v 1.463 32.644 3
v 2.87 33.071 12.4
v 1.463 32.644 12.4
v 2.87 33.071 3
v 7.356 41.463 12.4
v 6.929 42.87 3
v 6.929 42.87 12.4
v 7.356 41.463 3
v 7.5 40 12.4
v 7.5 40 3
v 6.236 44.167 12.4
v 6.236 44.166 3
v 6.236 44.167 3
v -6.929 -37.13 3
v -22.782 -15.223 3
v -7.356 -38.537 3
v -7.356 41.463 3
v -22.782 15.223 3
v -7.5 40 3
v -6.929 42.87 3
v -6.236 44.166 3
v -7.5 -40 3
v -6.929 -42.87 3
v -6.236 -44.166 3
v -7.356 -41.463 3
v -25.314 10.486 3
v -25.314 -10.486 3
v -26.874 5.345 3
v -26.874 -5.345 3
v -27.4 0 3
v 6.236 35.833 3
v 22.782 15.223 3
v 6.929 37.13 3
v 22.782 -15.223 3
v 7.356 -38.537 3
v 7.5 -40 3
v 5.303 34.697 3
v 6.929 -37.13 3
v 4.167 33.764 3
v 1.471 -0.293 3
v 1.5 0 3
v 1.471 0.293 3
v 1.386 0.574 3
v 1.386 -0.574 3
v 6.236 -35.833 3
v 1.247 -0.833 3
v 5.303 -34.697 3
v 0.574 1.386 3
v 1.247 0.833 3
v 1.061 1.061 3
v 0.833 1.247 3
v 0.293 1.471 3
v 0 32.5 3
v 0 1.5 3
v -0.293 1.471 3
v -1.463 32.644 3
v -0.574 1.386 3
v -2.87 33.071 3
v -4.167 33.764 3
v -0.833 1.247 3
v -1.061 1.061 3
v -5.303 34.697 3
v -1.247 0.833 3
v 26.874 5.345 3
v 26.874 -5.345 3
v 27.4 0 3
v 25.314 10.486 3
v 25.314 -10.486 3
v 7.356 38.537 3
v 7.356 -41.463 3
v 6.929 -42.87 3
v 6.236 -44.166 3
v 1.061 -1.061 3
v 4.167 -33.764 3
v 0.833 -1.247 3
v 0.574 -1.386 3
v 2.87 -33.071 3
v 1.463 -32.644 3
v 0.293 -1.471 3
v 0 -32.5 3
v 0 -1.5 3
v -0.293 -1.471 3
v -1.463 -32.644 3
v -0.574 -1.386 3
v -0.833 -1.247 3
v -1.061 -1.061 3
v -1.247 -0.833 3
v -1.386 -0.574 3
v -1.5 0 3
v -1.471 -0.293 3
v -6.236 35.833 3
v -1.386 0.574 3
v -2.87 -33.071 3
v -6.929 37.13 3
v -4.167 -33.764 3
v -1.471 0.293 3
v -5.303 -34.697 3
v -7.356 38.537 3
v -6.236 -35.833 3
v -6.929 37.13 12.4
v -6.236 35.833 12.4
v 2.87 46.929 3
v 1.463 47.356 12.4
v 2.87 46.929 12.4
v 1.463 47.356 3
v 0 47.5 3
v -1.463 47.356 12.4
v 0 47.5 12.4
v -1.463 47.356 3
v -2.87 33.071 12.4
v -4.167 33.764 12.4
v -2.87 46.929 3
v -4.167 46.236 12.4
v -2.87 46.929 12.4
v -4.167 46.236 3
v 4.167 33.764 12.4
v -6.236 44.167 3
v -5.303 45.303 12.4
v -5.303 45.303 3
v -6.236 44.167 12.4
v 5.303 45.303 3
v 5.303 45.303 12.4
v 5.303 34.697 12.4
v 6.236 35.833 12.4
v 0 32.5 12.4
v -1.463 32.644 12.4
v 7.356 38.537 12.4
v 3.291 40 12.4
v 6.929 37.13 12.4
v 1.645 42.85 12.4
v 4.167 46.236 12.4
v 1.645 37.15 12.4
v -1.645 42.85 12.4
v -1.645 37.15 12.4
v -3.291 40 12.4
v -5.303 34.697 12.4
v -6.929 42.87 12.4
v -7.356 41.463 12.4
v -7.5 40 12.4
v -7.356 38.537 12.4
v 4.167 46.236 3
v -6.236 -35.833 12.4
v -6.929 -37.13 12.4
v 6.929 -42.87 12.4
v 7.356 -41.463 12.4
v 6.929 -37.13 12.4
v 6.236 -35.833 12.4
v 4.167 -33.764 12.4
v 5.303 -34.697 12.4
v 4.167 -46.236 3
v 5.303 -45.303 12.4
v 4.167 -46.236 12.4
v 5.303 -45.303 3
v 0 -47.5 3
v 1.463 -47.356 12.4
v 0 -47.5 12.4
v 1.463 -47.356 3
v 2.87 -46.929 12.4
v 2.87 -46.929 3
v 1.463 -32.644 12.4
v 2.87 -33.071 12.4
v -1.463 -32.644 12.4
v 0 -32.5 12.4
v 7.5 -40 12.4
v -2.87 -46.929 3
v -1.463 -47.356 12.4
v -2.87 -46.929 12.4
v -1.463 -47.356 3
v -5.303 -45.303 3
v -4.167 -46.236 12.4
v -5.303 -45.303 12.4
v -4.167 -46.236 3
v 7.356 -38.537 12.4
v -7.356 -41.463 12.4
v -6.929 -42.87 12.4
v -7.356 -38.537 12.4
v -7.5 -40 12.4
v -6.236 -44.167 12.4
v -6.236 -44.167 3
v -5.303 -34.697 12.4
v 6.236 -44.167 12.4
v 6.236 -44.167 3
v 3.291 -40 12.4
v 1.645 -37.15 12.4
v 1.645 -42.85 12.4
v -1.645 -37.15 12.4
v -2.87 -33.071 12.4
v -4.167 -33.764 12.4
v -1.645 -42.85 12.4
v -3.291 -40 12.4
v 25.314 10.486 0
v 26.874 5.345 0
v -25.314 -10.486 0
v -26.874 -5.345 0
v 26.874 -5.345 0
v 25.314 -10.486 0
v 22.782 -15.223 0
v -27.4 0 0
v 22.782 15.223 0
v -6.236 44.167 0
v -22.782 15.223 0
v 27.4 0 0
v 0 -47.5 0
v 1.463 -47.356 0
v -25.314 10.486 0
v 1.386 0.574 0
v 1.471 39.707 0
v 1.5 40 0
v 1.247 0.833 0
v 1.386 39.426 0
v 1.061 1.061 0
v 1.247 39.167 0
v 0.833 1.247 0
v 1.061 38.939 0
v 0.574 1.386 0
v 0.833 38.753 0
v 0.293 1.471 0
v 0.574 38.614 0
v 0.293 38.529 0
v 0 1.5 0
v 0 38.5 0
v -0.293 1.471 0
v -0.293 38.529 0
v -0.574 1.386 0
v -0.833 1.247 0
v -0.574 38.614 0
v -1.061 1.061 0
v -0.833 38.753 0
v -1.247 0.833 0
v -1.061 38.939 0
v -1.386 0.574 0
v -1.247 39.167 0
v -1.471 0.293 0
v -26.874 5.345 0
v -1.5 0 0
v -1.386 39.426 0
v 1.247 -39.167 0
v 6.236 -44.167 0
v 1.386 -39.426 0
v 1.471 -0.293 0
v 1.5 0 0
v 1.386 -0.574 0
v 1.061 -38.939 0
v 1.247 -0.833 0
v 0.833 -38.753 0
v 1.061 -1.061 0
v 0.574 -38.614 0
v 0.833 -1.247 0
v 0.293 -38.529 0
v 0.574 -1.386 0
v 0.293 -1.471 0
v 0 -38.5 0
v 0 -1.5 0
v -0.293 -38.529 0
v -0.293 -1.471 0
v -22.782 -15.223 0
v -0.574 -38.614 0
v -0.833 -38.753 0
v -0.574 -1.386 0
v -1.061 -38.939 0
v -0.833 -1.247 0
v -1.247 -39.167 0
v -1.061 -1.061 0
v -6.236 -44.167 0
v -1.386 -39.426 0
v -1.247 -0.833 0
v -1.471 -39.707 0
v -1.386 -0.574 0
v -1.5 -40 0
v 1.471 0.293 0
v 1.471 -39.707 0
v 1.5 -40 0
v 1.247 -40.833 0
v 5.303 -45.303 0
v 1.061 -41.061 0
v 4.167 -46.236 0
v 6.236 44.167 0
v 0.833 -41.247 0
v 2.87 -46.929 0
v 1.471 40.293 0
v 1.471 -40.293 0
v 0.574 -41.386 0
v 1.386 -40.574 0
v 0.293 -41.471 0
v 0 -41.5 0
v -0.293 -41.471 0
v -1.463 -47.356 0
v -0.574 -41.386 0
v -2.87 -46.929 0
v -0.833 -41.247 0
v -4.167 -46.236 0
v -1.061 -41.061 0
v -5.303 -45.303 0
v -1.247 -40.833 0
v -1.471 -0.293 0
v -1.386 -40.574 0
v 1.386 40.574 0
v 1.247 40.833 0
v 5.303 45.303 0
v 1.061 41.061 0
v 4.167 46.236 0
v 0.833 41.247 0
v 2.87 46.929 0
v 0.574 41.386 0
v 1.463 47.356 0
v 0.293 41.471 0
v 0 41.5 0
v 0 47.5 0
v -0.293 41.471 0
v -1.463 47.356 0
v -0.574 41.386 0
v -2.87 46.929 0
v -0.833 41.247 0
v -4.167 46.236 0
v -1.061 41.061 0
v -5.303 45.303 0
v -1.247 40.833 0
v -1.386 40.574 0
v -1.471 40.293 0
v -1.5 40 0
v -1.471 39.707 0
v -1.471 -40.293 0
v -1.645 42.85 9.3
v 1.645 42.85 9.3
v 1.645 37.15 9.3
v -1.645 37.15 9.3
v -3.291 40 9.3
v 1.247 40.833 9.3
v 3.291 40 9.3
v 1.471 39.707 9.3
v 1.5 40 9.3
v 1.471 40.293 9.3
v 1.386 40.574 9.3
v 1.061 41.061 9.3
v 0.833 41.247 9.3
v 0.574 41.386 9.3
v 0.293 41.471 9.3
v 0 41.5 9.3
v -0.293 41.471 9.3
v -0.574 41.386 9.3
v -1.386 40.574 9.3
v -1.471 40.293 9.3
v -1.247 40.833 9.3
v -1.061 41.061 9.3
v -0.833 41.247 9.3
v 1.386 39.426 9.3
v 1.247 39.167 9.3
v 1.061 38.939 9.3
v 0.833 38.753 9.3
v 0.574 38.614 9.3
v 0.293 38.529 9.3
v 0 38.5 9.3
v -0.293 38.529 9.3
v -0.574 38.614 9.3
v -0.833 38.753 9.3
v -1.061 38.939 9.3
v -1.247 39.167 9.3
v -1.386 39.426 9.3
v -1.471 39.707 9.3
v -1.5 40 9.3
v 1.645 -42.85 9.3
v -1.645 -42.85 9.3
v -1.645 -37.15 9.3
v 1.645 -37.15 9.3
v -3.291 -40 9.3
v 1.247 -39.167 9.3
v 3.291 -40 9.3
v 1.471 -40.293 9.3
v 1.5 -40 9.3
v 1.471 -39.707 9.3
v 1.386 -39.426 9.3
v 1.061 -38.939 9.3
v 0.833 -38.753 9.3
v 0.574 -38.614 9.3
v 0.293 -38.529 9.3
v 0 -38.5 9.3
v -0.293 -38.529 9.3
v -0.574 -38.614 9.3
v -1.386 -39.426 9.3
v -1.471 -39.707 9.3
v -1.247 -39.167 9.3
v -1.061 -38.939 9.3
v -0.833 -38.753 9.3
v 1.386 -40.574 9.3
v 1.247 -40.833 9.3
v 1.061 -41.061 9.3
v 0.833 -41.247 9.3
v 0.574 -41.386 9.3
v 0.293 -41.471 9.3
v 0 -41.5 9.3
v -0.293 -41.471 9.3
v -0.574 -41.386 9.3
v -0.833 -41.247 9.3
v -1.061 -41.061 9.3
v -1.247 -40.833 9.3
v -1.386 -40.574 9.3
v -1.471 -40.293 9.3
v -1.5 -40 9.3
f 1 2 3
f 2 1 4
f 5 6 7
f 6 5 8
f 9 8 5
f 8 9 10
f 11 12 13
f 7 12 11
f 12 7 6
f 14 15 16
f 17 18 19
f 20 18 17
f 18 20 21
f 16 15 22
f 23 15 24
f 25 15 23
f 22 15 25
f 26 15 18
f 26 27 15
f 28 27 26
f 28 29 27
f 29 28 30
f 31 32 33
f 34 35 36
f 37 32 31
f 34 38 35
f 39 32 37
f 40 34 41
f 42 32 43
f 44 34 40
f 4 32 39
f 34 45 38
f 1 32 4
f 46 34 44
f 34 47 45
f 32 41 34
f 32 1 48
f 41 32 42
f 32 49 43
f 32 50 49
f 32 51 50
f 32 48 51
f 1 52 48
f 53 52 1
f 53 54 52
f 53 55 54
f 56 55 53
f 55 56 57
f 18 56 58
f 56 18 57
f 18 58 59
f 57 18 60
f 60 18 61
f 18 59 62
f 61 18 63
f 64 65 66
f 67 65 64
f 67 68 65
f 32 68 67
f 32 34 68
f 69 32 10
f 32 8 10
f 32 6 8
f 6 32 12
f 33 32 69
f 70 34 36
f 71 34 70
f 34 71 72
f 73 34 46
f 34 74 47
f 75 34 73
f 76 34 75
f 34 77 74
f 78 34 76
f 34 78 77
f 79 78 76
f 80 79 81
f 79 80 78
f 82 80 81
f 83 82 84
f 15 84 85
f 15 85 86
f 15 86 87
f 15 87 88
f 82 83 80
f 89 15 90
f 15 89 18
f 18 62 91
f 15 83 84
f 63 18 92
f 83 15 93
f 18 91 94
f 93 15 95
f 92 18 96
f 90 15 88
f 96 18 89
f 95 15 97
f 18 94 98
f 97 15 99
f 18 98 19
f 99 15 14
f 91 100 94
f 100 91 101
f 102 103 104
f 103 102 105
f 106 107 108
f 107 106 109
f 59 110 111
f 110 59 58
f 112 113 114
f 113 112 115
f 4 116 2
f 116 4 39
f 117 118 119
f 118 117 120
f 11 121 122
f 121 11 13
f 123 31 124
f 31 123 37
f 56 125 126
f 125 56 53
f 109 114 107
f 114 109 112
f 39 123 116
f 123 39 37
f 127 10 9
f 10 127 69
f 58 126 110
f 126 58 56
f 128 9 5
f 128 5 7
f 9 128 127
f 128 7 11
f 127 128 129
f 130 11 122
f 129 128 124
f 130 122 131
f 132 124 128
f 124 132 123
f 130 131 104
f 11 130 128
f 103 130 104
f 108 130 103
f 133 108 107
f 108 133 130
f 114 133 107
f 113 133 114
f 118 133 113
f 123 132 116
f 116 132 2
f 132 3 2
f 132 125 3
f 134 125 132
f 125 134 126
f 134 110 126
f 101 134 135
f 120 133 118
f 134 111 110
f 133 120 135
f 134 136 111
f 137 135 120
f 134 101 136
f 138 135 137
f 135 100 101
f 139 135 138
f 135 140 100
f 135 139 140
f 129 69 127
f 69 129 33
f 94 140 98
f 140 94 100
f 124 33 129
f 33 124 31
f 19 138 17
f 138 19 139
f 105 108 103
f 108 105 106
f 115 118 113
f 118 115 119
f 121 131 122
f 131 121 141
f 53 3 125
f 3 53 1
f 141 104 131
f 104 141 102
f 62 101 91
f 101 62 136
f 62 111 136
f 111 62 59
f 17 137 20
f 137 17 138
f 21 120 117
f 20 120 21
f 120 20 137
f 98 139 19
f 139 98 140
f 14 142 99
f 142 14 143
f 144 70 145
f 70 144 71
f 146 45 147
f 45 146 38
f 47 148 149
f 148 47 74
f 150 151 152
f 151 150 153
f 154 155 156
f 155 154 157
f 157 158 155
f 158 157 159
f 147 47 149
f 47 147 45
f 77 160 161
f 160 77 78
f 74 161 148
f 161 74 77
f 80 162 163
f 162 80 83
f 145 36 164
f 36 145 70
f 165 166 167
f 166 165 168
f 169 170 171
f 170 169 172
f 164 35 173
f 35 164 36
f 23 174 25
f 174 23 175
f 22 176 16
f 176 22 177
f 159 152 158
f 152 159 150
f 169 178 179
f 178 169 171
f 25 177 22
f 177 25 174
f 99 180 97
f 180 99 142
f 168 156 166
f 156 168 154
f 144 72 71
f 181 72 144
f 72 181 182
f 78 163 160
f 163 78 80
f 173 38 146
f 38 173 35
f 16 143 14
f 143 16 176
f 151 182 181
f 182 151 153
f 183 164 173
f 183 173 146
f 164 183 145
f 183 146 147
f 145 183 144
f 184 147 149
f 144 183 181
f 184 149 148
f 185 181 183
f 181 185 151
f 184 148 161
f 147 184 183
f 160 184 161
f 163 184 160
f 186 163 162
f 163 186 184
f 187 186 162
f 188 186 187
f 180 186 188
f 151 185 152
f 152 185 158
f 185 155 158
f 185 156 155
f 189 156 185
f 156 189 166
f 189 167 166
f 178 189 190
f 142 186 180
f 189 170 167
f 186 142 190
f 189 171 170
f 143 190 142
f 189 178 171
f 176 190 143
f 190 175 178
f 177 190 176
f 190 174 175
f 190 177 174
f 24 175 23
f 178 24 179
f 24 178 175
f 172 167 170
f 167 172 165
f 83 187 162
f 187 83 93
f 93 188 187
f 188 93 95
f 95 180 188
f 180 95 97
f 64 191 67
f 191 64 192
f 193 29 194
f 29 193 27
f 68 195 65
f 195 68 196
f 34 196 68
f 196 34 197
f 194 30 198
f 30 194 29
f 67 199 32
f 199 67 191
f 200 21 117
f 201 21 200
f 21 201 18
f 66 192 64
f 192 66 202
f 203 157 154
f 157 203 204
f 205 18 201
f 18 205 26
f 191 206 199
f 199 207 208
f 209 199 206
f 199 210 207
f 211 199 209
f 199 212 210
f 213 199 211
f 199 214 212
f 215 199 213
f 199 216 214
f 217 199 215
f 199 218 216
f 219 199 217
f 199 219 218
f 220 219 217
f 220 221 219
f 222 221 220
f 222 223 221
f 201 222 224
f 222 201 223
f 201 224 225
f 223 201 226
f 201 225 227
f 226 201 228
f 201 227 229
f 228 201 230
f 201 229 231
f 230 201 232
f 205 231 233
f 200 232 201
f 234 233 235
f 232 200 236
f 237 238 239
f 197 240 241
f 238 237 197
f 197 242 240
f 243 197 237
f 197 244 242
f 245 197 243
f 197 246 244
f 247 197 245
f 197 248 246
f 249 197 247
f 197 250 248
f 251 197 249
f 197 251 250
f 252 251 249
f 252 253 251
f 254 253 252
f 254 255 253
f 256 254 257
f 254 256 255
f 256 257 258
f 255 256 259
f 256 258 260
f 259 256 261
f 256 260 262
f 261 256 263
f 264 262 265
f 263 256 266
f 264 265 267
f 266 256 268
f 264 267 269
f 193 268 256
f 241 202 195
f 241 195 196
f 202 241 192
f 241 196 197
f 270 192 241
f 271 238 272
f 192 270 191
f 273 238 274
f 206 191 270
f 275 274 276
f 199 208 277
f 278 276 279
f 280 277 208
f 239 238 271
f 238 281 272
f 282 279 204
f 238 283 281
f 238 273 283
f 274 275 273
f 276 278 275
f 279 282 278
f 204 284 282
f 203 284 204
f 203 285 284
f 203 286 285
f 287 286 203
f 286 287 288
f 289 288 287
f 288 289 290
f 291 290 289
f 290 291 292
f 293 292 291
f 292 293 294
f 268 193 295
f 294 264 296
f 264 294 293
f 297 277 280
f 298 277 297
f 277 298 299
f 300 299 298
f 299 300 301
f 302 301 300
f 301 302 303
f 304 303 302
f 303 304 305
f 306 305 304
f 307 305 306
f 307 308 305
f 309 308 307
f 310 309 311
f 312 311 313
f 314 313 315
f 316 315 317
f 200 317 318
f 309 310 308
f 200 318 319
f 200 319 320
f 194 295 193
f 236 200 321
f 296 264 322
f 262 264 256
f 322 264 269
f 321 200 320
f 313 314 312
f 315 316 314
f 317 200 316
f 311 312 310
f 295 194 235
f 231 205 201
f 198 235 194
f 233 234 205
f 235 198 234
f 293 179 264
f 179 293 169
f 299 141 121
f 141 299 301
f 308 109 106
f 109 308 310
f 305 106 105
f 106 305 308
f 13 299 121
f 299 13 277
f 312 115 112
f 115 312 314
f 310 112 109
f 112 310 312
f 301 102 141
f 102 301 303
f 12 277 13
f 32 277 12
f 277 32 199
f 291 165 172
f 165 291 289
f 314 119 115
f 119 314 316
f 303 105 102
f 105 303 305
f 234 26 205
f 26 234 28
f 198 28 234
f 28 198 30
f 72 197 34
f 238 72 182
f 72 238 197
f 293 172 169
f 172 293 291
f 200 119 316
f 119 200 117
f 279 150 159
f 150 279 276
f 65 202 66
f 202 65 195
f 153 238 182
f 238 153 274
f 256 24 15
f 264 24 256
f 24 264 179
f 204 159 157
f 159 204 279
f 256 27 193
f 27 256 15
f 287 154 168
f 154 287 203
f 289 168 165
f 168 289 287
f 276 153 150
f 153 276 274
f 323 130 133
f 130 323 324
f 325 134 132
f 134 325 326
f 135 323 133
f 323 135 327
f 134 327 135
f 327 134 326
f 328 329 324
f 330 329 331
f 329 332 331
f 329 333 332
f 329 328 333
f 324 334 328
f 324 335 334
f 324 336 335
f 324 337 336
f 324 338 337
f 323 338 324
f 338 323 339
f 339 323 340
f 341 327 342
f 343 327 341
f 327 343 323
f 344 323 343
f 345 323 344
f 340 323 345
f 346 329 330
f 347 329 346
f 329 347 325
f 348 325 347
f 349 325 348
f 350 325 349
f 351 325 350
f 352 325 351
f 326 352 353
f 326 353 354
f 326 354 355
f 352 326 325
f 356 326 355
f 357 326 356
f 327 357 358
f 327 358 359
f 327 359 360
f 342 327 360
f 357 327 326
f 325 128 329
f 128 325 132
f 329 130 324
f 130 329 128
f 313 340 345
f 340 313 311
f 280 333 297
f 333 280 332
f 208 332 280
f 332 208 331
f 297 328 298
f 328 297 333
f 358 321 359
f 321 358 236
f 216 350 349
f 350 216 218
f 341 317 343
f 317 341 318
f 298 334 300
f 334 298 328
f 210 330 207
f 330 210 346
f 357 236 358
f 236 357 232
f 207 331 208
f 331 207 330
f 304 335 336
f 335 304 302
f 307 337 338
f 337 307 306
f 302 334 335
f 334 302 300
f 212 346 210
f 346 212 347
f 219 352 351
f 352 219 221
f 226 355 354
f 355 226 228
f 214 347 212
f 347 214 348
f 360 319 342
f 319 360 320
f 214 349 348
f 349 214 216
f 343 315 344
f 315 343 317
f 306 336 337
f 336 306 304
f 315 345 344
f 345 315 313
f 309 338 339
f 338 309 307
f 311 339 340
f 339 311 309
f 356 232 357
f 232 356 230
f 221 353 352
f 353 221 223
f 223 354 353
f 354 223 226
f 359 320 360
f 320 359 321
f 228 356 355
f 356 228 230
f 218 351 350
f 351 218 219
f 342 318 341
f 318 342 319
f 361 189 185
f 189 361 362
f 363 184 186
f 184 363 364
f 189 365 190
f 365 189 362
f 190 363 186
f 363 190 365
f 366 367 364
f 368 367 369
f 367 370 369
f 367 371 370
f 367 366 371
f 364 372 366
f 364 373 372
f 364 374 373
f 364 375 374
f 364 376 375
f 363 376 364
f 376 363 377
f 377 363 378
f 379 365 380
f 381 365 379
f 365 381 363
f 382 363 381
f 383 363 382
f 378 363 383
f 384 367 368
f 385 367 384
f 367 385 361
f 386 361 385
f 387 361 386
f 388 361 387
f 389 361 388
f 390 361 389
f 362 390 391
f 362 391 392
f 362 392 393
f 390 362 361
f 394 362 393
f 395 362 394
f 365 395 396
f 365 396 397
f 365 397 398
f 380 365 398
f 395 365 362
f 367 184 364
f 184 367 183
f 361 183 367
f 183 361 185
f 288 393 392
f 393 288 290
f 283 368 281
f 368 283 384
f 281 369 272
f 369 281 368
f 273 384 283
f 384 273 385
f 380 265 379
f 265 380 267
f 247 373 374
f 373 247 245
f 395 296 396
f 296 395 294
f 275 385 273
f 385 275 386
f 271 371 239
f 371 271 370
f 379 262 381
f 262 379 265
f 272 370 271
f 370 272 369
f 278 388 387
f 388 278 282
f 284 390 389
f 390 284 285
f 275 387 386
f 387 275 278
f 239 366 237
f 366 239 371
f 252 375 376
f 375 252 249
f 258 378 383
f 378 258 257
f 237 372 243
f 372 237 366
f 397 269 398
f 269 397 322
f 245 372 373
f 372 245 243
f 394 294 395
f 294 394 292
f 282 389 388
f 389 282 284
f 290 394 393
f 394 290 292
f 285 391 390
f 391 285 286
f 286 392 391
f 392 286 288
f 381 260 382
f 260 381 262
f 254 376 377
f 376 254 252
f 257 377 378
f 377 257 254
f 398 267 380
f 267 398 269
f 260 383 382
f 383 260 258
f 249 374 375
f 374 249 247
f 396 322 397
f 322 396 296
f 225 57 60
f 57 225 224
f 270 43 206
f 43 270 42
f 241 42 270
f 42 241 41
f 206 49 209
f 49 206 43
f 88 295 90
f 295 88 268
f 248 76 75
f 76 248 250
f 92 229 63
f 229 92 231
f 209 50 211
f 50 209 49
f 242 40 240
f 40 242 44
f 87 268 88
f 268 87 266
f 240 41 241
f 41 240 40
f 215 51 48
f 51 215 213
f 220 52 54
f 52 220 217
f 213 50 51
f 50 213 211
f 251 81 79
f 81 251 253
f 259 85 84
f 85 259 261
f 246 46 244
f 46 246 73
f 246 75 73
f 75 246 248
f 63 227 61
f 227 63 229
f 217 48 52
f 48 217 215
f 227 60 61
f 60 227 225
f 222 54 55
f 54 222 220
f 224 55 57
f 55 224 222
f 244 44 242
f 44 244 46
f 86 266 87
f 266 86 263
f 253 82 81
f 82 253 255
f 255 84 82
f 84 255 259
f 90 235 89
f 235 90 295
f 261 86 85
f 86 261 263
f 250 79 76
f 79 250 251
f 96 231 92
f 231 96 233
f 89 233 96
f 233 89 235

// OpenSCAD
// file: oem/generic/third_party/shortcuts.scad
// ShortCuts.scad 
// Autor: Rudolf Huttary, Berlin 2015
//
$fn = 100; 


//show_examples(); 

module show_examples()
	place_in_rect(30, 30)
	{
		Cy(h = 10); 
		CyH(h = 10); 
		CyH(h = 10, w = 30); 
		CyS(h = 10); 
		CyS(h = 10, w1 = 25, w2 = 75); 
		Cu(10); 
		Ri(h = 10); 
		RiH(h = 10); 
		RiS(h = 10, w1 = 10); 
		RiS(h = 10, w1 = 30, w2 = 300); 
		Sp(); 
		SpH(10, 30, 30); 
	}



module help()
{
echo("==============="); 
echo("help(): shows this help"); 
echo("show_examples(): shows some examples"); 
echo("place_in_rect(): places children objects in grid"); 
echo("Transformations:"); 
echo(" transform :  T(x=0, y=0, z=0), Tx(x=0) , Ty(y=0), Tz(z=0)"); 
echo(" rotate :  R(x=0, y=0, z=0), Rx(x=0) , Ry(y=0), Rz(z=0)"); 
echo(" scale :  S(x=1, y=1, z=1), Sx(x=1) , Sy(y=1), Sz(z=1)"); 
echo("Logical"); 
echo(" difference :  D()"); 
echo(" union :  U()"); 
echo(" intersection : *missing*"); 
echo("Primitives"); 
echo(" circle :  Ci(r=10)"); 
echo(" circle_half :  CiH(r=10, w=0)")
echo(" circle_segment :  CiS(r=10, w1=0, w2=90)")
echo(" square :  Sq(x=10, y=0, center=true))"); 
echo(" cylinder :  Cy(r=10, h=1, center=true)"); 
echo(" cylinder_half :  CyH(r=10, w=0)")
echo(" cylinder_segment: CyS(r=10, h=1, w1=0, w2=90,center=true)"); 
echo(" cylinder_segment: Pie(r=10, h=1, w1=0, w2=90,center=true)"); 
echo(" cube :  Cu(x=10, y=0, z=10, center=true)"); 
echo(" ring :  Ri(R=10, r=5, h=1, center=true)"); 
echo(" ring_half :  RiH(R=10, r=5, h=1, w=0 center=true)"); 
echo(" ring_segment :  RiS(R=10, r=5, h=1, w1=0, w2=90, center=true)"); 
echo(" sphere:  Sp(r=10))"); 
echo(" sphere_half:  SpH(r=10, w1 = 0, w2 = 0))"); 
echo("==============="); 
}


// Euclidean Transformations

module T(x=0, y=0, z=0){translate([x, y, z])children(); }
module Tx(x) { translate([x, 0, 0])children(); }
module Ty(y) { translate([0, y, 0])children(); }
module Tz(z) { translate([0, 0, z])children(); }


module R(x=0, y=0, z=0){rotate([x, y, z]) children();}
module Rx(x=90){rotate([x, 0, 0]) children();}
module Ry(y=90){rotate([0, y, 0]) children();}
module Rz(z=90){rotate([0, 0, z]) children();}

module S(x=1, y=1, z=1){scale([x, y, z]) children();}
module Sx(x=1){scale([x, 1, 1]) children();}
module Sy(y=1){scale([1, y, 1]) children();}
module Sz(z=1){scale([1, 1, z]) children();}


module D() difference(){children(0); children([1:$children-1]);}
module U() children([0:$children-1]);
// module I() intersection()children([0:$children-1]); // does not work for some reason


// primitives - 2D

module Sq(x =10, y = 0, center = true)
{
   if(y==0)
		square([x, x], center = center); 
	else
		square([x, y], center = center); 
}
module Ci(r = 10)
{
	circle(r = r); 
}

// derived primitives - 2d
module CiH(r = 10, w = 0)
  circle_half(r, w); 

module CiS(r = 10, w1 = 0, w2 = 90)
  circle_segment(r, w1, w2); 


// primitives - 3d
module Cy(r = 10, h = 1, center = true)
{
	cylinder(r = r, h = h, center = center); 
}
module Cu(x = 10, y = 0, z = 10, center = true)
{
  if (y==0)
	cube([x, x, x], center = center); 
  else
	cube([x, y, z], center = center); 
}

// derived primitives - 3d
module CyH(r = 10, h = 1, w = 0, center = true)
  cylinder_half(r, h, w, center); 

module CyS(r = 10, h = 1, w1 = 0, w2 = 90, center = true)
  cylinder_segment(r, h, w1, w2, center); 

module Ri(R = 10, r = 5, h = 1, center = true)
  ring(R, r, h, center); 

module RiS(R = 10, r = 5, h = 1, w1 = 0, w2 = 90, center = true)
   ring_segment(R, r, h, w1, w2, center); 

module RiH(r1 = 10, r2, h = 1, w = 0, center = true)
   ring_half(r1, r2, h, w, center); 
module Pie(r = 10, h = 1, w1 = 0, w2 = 90, center = true)
  cylinder_segment(r, h, w1, w2, center);  
module Sp(r = 10)
  sphere(r); 
module SpH(r = 10, w1 = 0, w2 = 0)
  sphere_half(r, w1, w2); 
module SpS(r = 10, w1 = 0, w2 = 90, w3 = 90)
  sphere_segment(r, w1, w2); 




// clear text definitions
module circle_half(r = 10, w = 0)
{
	difference()
	{
		circle(r); 
     rotate([0, 0, w-90])
     translate([0, -r])
		square([r, 2*r], center = false); 
	}
}

module circle_segment(r = 10, w1 = 0, w2 = 90)
{
  W2 = (w1>w2)?w2+360:w2; 
  if (W2-w1 < 180)
    intersection()
		{
       circle_half(r, w1); 
       circle_half(r, W2-180); 
 		}
	else
    union()
		{
       circle_half(r, w1); 
       circle_half(r, W2-180); 
 		}
}

module cylinder_half(r = 10, h = 1, w = 0, center = true)
{
  linear_extrude(height = h, center = center)
  circle_half(r, w); 
} 

module cylinder_segment(r = 10, h = 1, w1 = 0, w2 = 90, center = true)
{
  linear_extrude(height = h, center = center)
  circle_segment(r, w1, w2); 
} 

module ring(R = 10, r = 5, h = 1, center = true)
{
	difference()
	{
	cylinder(r = R, h = h, center = center); 
   translate([0, 0, -2*h])
	cylinder(r = r, h = 4*h, center = false); 
	}
}

module ring_half(R = 10, r = 5, h = 1, w = 0, center = true)
{
	difference()
	{
		ring(R, r, h, center); 
     rotate([0, 0, w])
     translate([0, -R/2, 0])
		cube([2*R, R, 3*h], center = true); 
	}
}

module ring_segment(R = 10, r = 5, h = 1, w1 = 0, w2 = 90, center = true)
{
  W2 = (w1>w2)?w2+360:w2; 
  if (W2-w1 < 180)
    intersection()
		{
       ring_half(R, r, h, w1, center); 
       ring_half(R, r, h, W2-180, center); 
 		}
	else
    union()
		{
       ring_half(R, r, h, w1, center); 
       ring_half(R, r, h, W2-180, center); 
 		}
}


module sphere_half(r = 10, w1 = 0, w2 = 0)
{  
	difference()
	{
   	sphere(r); 
      rotate([-w1, -w2, 0])
     	translate([0, 0, r])
		cube(2*r, 2*r, r, center = true); 
	}

}


// additional code
module place_in_rect(dx =20, dy=20)
{
  cols = ceil(sqrt($children)); 
  rows = floor(sqrt($children)); 
  for(i = [0:$children-1])
	{ 
	  T(dx*(-cols/2+(i%cols)+.5), dy*(rows/2-floor(i/cols)-.5))
		 children(i); 
	}
}
// file: oem/generic/third_party/springs.scad
include <shortcuts.scad>  // http://www.thingiverse.com/thing:644830
$fn = 100;
help();
//examples();  // slow!! F6 takes hours!
module examples()
{
place_in_rect(60, 60)
{
// examples spring:
	spring(Windings = 7, R = 10, r = 1, h = 20);  // clockwise
	R(90) spring(Windings = 3, R = 12, r = 2, h = -60); // ccw

// examples helicoils:
	helicoil(Windings = 10);  // square wire
	helicoil(clockwise = false, square = true);  // ccw + round wire

// examples elliptic rings:
	elliptic_ring(10, 5, 1);
	elliptic_ring(10, 10, 1);  // non elliptic
	elliptic_ring(h = 10);  // element of a spring
	elliptic_ring(h = 10, w = 240);  // partial ring

// example chain:
	U()
	{
	 Rx(90) T(15) elliptic_ring(); 
	 elliptic_ring(); 
	 Rx(90) T(-15) elliptic_ring(); 
	}
}
}

module help()
{
	echo("===== springs.scad - signatures [by Rudolf Huttary, Berlin] ===="); 
	echo("elliptic_ring(r1 = 10, r2 = 5, r = 2, slices = 100, h = 0, w = 360)
"); 
	echo("helicoil(Windings = 5, R = 20, r = 1, slices = 50, clockwise = true, square = true)"); 
	echo("spring(Windings = 5, R = 20, r=2, h = 20, slices = 50)"); 
	echo("elliptic_spring(Windings = 5, R1 = 20, R2 = 0, r=1, h = 20, slices = 50)"); 
	echo("===== springs.scad - end ===="); 
}


module elliptic_ring(r1 = 10, r2 = 5, r = 2, slices = 100, h = 0, w = 360)
{
	dz = h/slices; 
   dwx = atan(h/(r1+r2)/PI); 
	for (i = [0:slices-1])
	hull()
	{
		T(r1*cos((i+1)*w/slices), r2*sin((i+1)*w/slices), (i+1)*dz)
	   R(90+dwx, 0, (i+1)*w/slices)
		Cy(r = r, h = .01); 
	
		T(r1*cos((i)*w/slices), r2*sin((i)*w/slices), i*dz)
	   R(90+dwx, 0, i*w/slices)
		Cy(r = r, h = .01); 
	}
}

module helicoil(Windings = 5, R = 20, r = 1, slices = 50, clockwise = true, square = true)
{
  $fn = square? 4 :$fn; 
  h = clockwise?Windings*2*r:-Windings*2*r; 
  spring(Windings, R, r, h, slices); 
  T((.5*R)/2, r)
  Ry(90 )
  Cy(r, 1.5*R); 
}

module spring(Windings = 5, R = 20, r=2, h = 20, slices = 50)
	elliptic_spring(Windings, R, 0, r, h, slices); 

module elliptic_spring(Windings = 5, R1 = 20, R2 = 0, r=1, h = 20, slices = 50)
{
   dh = h/Windings;   
   r2 = (R2==0)?R1:R2; 
	for(j = [0:Windings-1])
		Tz(j*dh)
		elliptic_ring(R1, r2, r, slices, dh); 
}
// file: oem/m3_nut.scad
function vM3NutDatasheet() =
     [["e_min", 6.01], ["s_max", 5.5], ["m_max", 2.4]];



module mM3Nut() {
     import("stl/din934_m3_nut.stl");
}

mM3Nut();
// file: oem/f2276_sae1070_spring.scad
include <generic/lib.scad>;

use <generic/third_party/springs.scad>

function vF2276SAE1070SpringDatasheet() =
     let(wire_diameter=1, outer_diameter=18.1,
         inner_diameter=outer_diameter-2*wire_diameter,
         n_windings=8, free_length=43)
     [["outer_diameter", outer_diameter],
      ["inner_diameter", inner_diameter],
      ["wire_diameter", wire_diameter],
      ["pitch", free_length/n_windings],
      ["n_windings", n_windings],
      ["free_length", free_length]];

kF2276SAE1070SpringLength = property(vF2276SAE1070SpringDatasheet(), "free_length");

module mF2276SAE1070Spring(length=kF2276SAE1070SpringLength) {
     assert(length > 0);
     assert(length <= kF2276SAE1070SpringLength);

     datasheet = vF2276SAE1070SpringDatasheet();
     n_windings = property(datasheet, "n_windings");
     main_radius = (property(datasheet, "outer_diameter") +
                    property(datasheet, "inner_diameter")) / 4;
     wire_radius = property(datasheet, "wire_diameter") / 2;

     translate([0, 0, wire_radius])
     spring(Windings=n_windings, R=main_radius, r=wire_radius, h=length - 2 * wire_radius, slices=50);
}

mF2276SAE1070Spring();
// file: generic/ball_caster_support.scad
include <lib.scad>;

use <ball_caster_yoke.scad>;

function pvBallCasterSupportDatasheet(ball_diameter, ball_protrusion, ball_gap,
                                      wall_gap, wall_thickness, base_thickness,
                                      mount_offset, mount_diameter) =
     assert(ball_diameter > 0)
     assert(ball_protrusion > 0)
     assert(ball_diameter > ball_protrusion)
     assert(ball_gap > 0)
     assert(wall_gap > 0)
     assert(ball_diameter > 2 * wall_gap)
     assert(wall_thickness > 0)
     assert(base_thickness > 0)
     assert(mount_offset > ball_diameter/2)
     assert(mount_diameter > 0)
     [["ball_diameter", ball_diameter], ["ball_protrusion", ball_protrusion], ["ball_gap", ball_gap],
      ["wall_gap", wall_gap], ["wall_thickness", wall_thickness], ["base_thickness", base_thickness],
      ["mount_offset", mount_offset], ["mount_diameter", mount_diameter],
      ["ball_z_offset", base_thickness + ball_gap + ball_diameter / 2],
      ["main_height", base_thickness + ball_gap + ball_diameter - ball_protrusion],
      ["main_diameter", ball_diameter + 2 * wall_thickness]];

module pmBallCasterSupport(datasheet) {
     base_thickness = property(datasheet, "base_thickness");
     main_height = property(datasheet, "main_height");
     main_diameter = property(datasheet, "main_diameter");
     mount_offset = property(datasheet, "mount_offset");
     mount_diameter = property(datasheet, "mount_diameter");
     ball_diameter = property(datasheet, "ball_diameter");
     ball_protrusion = property(datasheet, "ball_protrusion");
     ball_gap = property(datasheet, "ball_gap");
     ball_z_offset = property(datasheet, "ball_z_offset");
     wall_gap = property(datasheet, "wall_gap");
     wall_thickness = property(datasheet, "wall_thickness");

     pmBallCasterYoke(datasheet);
     rotate([0, 0, 90]) {
          translate([0, 0, base_thickness]) {
               difference() {
                    cylinder(h=main_height - base_thickness, d=main_diameter);
                    translate([0, 0, ball_z_offset - base_thickness]) sphere(d=ball_diameter);
                    translate([-main_diameter / 2 - kEpsilon, -wall_gap / 2, 0]) {
                         cube([main_diameter + 2 * kEpsilon, wall_gap, main_height - base_thickness + kEpsilon]);
                    }
                    translate([-main_diameter/2 - kEpsilon, 0, main_height - base_thickness - wall_gap/2]) {
                         rotate([0, 90, 0]) cylinder(h=main_diameter + 2 * kEpsilon, d=2 * wall_gap, $fn=6);
                    }
                    cylinder(h=ball_diameter/4 + ball_gap, d=ball_diameter * sqrt(3)/2);
               }
          }
     }
}

pmBallCasterSupport(
     datasheet=pvBallCasterSupportDatasheet(
          ball_diameter=10, ball_protrusion=3, ball_gap=2,
          wall_gap=3, wall_thickness=2, base_thickness=2,
          mount_offset=10, mount_diameter=4
     )
);
// file: oem/generic/standoffs.scad
include <lib.scad>;

use <third_party/threads.scad>;

function pvMetricHexStandoffDatasheet(length, width, hole_diameter=0, thread_pitch=0) =
     assert(length > 0)
     assert(width > 0)
     assert(hole_diameter >= 0)
     assert(width > hole_diameter)
     assert(thread_pitch >= 0)
     [["length", length], ["width", width], ["hole_diameter", hole_diameter], ["thread_pitch", thread_pitch]];


module pmMetricHexStandoff(datasheet) {
     width = property(datasheet, "width");
     length = property(datasheet, "length");
     hole_diameter = property(datasheet, "hole_diameter");
     thread_pitch = property(datasheet, "thread_pitch");
     difference() {
          cylinder(d=width / cos(30), h=length, $fn=6);
          translate([0, 0, -length/2]) {
               if (hole_diameter > 0) {
                    if (thread_pitch > 0) {
                         metric_thread(diameter=hole_diameter, pitch=thread_pitch,
                                       length=2 * length, internal=true);
                    } else {
                         cylinder(d=hole_diameter, h=2 * length);
                    }
               }
          }
     }
}

pmMetricHexStandoff(
     datasheet=pvMetricHexStandoffDatasheet(
          length=20, width=5, hole_diameter=3, thread_pitch=1
     )
);
// file: oem/generic/lib.scad
$fn = 32;

kEpsilon = 1e-1;

function property(table, key) = table[search([key], table)[0]][1];

module sector(radius, angles, fn = $fn) {
     r = radius / cos(180 / fn);
     step = -360 / fn;

     points = concat([[0, 0]],
                     [for(a = [angles[0] : step : angles[1] - 360])
                               [r * cos(a), r * sin(a)]
                          ],
                     [[r * cos(angles[1]), r * sin(angles[1])]]
          );

     difference() {
          circle(radius, $fn = fn);
          polygon(points);
     }
}

module ring(inner_radius, outer_radius, angles = [0, 360], fn = $fn) {
     difference() {
          sector(radius=outer_radius, angles=angles, fn=fn);
          sector(radius=inner_radius, angles=angles+[-kEpsilon, kEpsilon], fn=fn);
     }
}

module rounded_ring(inner_radius, outer_radius, angles = [0, 360], fn = $fn) {
     step_angle = 360 / fn;
     ring_width = outer_radius - inner_radius;
     ring_mean_radius = (outer_radius + inner_radius) / 2;
     for (theta = angles) {
          theta_d = theta / step_angle;
          theta_frac = (theta_d - floor(theta_d) - 0.5) * step_angle;
          rho = ring_mean_radius * cos(step_angle/2) / cos(theta_frac);
          rotate(theta)
          translate([rho, 0])
          circle(d=ring_width);
     }
     ring(inner_radius=inner_radius,
          outer_radius=outer_radius,
          angles=angles, fn=fn);
}

module fillet(r) {
     difference() {
          difference() {
               offset(r=-r - kEpsilon)
                    offset(delta=r) {
                    children();
               }
               offset(r=r)
                    offset(delta=-r) {
                    children();
               }
          }
          children();
     }
     offset(r=r)
          offset(delta=-r) {
          children();
     }
}

module bench_fillet(r, order=1000) {
     difference() {
          fillet(r) {
               translate([-order/2-kEpsilon, 0]) {
                    square([order, order], center=true);
               }
               children();
          }
          translate([-order/2-kEpsilon, 0]) {
               square([order+kEpsilon, order+kEpsilon], center=true);
          }
     }
}

module curved_bench_fillet(r, bench_radius, order=1000, internal=true) {
     difference() {
          fillet(r) {
               if (internal) {
                    translate([bench_radius, 0]) {
                         ring(inner_radius=bench_radius + kEpsilon, outer_radius=bench_radius * order);
                    }
               } else {
                    translate([-bench_radius, 0]) circle(r=bench_radius - kEpsilon);
               }
               children();
          }
          if (internal) {
               translate([bench_radius, 0]) {
                    ring(inner_radius=bench_radius,
                         outer_radius=bench_radius * order - kEpsilon);
               }
          } else {
               translate([-bench_radius, 0]) circle(r=bench_radius);
          }

     }
}


module window(side, position=[0, 0, 0], order=1000) {
    difference() {
        children();
        translate(position)  {
            difference() {
                square(order, center=true);
                square(side, center=true);
            }
        }
    }
}


module rounded_cylinder(diameter, height, fillet_radius, center) {
     translate([0, 0, ! center ? height/2 : 0]) {
          minkowski() {
               cylinder(d=(diameter - 2 * fillet_radius),
                        h=(height - 2 * fillet_radius),
                        center=true);
               sphere(r=fillet_radius);
          }
     }
}


module curved_support_xsection(support_radius, fillet_radius,
                               wall_inner_radius, wall_outer_radius,
                               hole_radius = 0, internal=true) {
     support_angular_width = (4 * support_radius / wall_outer_radius) * 180 / PI;
     wall_thickness = wall_outer_radius - wall_inner_radius;
     rotate([0, 0, internal ? 180 : 0]) {
          difference() {
               window(6*support_radius) {
                    curved_bench_fillet(fillet_radius, bench_radius=wall_inner_radius, internal=internal) {
                         hull() {
                              translate([support_radius + wall_thickness/2, 0]) {
                                   circle(r=support_radius);
                              }
                              rotate([0, 0, ! internal ? 180 : 0])
                              translate([wall_inner_radius + wall_thickness/2, 0]) {
                                   ring(inner_radius=wall_inner_radius,
                                        outer_radius=wall_outer_radius,
                                        angles=[180 - support_angular_width/2,
                                                180 + support_angular_width/2]);
                              }
                         }
                         rotate([0, 0, ! internal ? 180 : 0])
                         translate([wall_inner_radius + wall_thickness/2, 0]) {
                              ring(inner_radius=wall_inner_radius,
                                   outer_radius=wall_outer_radius,
                                   angles=[180 - support_angular_width,
                                           180 + support_angular_width]);
                         }
                    }
               }
               if (hole_radius > 0) {
                    translate([support_radius + wall_thickness/2, 0]) {
                         circle(r=hole_radius);
                    }
               }
          }
     }
}

module fill(upto=1000) {
     offset(delta=-upto) {
          offset(delta=upto) {
               children();
          }
     }
}

module outline(delta) {
     if (delta > 0) {
          difference() {
               offset(delta=delta) {
                    children();
               }
               children();
          }
     } else {
          difference() {
               children();
               offset(delta=delta) {
                    children();
               }
          }
     }
}

module duplicate(v) {
     children();
     mirror(v) children();
}

function steps(start, end, n) = [start:(end - start)/(n - 1):end];

function sigmoid(x) = 1.0 / (1.0 + exp(-x));

module sigmoid_profile(length, width, order=10, fn = $fn) {
     step = length / fn;
     points = concat(
          [[0, 0]],
          [for (x = [step:step:length-step]) [x, width * sigmoid(2 * order * ((x / length) - 0.5))]],
          [[length, width], [0, width]]

     );
     polygon(points=points);
}

module exp_nerve_xsection(height, length, decay_rate = 5, fn = $fn) {
     step = length / fn;
     points = concat(
          [[0, 0]],
          [for (x = [0:step:length-step]) [x, height * exp(-x/decay_rate)]],
          [[length, 0]]
          );
     polygon(points=points);
}

module exp_nerve(height, length, thickness, decay_rate = 3, fn = $fn) {
     rotate([90, 0, 0])
     linear_extrude(height=thickness, center=true) {
          exp_nerve_xsection(height, length, decay_rate, fn);
     }
}

module exp_corner_nerve(height, radius, angles, corner_radius = 0, decay_rate = 3, fn = $fn) {
     difference() {
          rotate_extrude() {
               if (corner_radius > 0) {
                    translate([corner_radius, 0, 0])
                    exp_nerve_xsection(height=height, length=radius, decay_rate=decay_rate, fn=fn);
               } else {
                    translate([-corner_radius, 0, 0])
                    mirror([1, 0, 0])
                    exp_nerve_xsection(height=height, length=radius, decay_rate=decay_rate, fn=fn);
               }
          }
          linear_extrude(height=2 * height, center=true) {
               sector(radius=radius + abs(corner_radius), angles=[angles[1], angles[0] + 360], fn=fn);
          }
     }
}
// file: 50mm_ball_caster_spring_seat.scad
include <generic/lib.scad>;

use <oem/f2276_sae1070_spring.scad>;
use <oem/m3x5mm_threaded_insert.scad>;
use <oem/m3_nut.scad>;


function v50mmBallCasterSpringSeatDatasheet() =
     let(nut_datasheet = vM3NutDatasheet(),
         spring_datasheet=vF2276SAE1070SpringDatasheet(),
         nut_m_max=property(nut_datasheet, "m_max"),
         threaded_insert_datasheet=vM3x5mmThreadedInsertDatasheet(),
         threaded_insert_length=property(threaded_insert_datasheet, "length"),
         spring_outer_diameter=property(spring_datasheet, "outer_diameter"),
         spring_inner_diameter=property(spring_datasheet, "inner_diameter"),
         spring_wire_diameter=property(spring_datasheet, "wire_diameter"),
         spring_pitch=property(spring_datasheet, "pitch"), base_thickness=2)
     [["base_thickness", base_thickness],
      ["inner_diameter", spring_inner_diameter],
      ["outer_diameter", spring_outer_diameter + 2 * spring_wire_diameter],
      ["height", base_thickness + max(threaded_insert_length + nut_m_max, spring_pitch)]];


module m50mmBallCasterSpringSeat() {
     datasheet = v50mmBallCasterSpringSeatDatasheet();
     base_thickness = property(datasheet, "base_thickness");
     outer_diameter = property(datasheet, "outer_diameter");
     inner_diameter = property(datasheet, "inner_diameter");
     height = property(datasheet, "height");

     difference() {
          union() {
               cylinder(d=outer_diameter, h=base_thickness);
               cylinder(d=inner_diameter, h=height);
          }
          let(hole_diameter=property(vM3x5mmThreadedInsertDatasheet(), "nominal_diameter")) {
               translate([0, 0, -kEpsilon]) {
                    cylinder(d=hole_diameter, h=height + 2 * kEpsilon);
               }
          }
     }
}


m50mmBallCasterSpringSeat();
// file: 50mm_ball_caster_support.scad
include <generic/lib.scad>;

use <generic/ball_caster_support.scad>;

use <oem/m3_hex_standoff.scad>;

function v50mmBallCasterSupportDatasheet() =
     pvBallCasterSupportDatasheet(ball_diameter=50.8, ball_protrusion=20, ball_gap=3,
                                  wall_gap=10, wall_thickness=2, base_thickness=3,
                                  mount_offset=40, mount_diameter=15);

module m50mmBallCasterSupport() {
     datasheet = v50mmBallCasterSupportDatasheet();
     base_thickness = property(datasheet, "base_thickness");
     mount_offset = property(datasheet, "mount_offset");
     difference() {
          pmBallCasterSupport(datasheet);
          translate([0, 0, -kEpsilon]) {
               duplicate([0, 1, 0]) {
                    translate([0, mount_offset, 0]) {
                         linear_extrude(height=base_thickness + 2 * kEpsilon) {
                              offset(delta=kEpsilon) {
                                   hull() projection() mM3x40mmHexStandoff();
                              }
                         }
                    }
               }
          }
     }
}

m50mmBallCasterSupport();
// file: oem/m3_hex_standoff.scad
include <generic/lib.scad>;

use <generic/standoffs.scad>;

function vM3x30mmHexThreadedStandoffDatasheet() =
     pvMetricHexStandoffDatasheet(hole_diameter=3, thread_pitch=0.5, length=30, width=5.5);

module mM3x30mmHexThreadedStandoff() {
     pmMetricHexStandoff(datasheet=vM3x30mmHexThreadedStandoffDatasheet());
}

function vM3x30mmHexStandoffDatasheet() =
     pvMetricHexStandoffDatasheet(hole_diameter=3, length=30, width=5.5);

module mM3x30mmHexStandoff() {
     pmMetricHexStandoff(datasheet=vM3x30mmHexStandoffDatasheet());
}


function vM3x40mmHexThreadedStandoffDatasheet() =
     pvMetricHexStandoffDatasheet(hole_diameter=3, thread_pitch=0.5, length=40, width=5.5);

module mM3x40mmHexThreadedStandoff() {
     pmMetricHexStandoff(datasheet=vM3x40mmHexThreadedStandoffDatasheet());
}

function vM3x40mmHexStandoffDatasheet() =
     pvMetricHexStandoffDatasheet(hole_diameter=3, length=40, width=5.5);

module mM3x40mmHexStandoff() {
     pmMetricHexStandoff(datasheet=vM3x40mmHexStandoffDatasheet());
}


function vM3x15mmHexThreadedStandoffDatasheet() =
     pvMetricHexStandoffDatasheet(hole_diameter=3, thread_pitch=0.5, length=15, width=5.5);

module mM3x15mmHexThreadedStandoff() {
     pmMetricHexStandoff(datasheet=vM3x15mmHexThreadedStandoffDatasheet());
}

function vM3x15mmHexStandoffDatasheet() =
     pvMetricHexStandoffDatasheet(hole_diameter=3, length=15, width=5.5);

module mM3x15mmHexStandoff() {
     pmMetricHexStandoff(datasheet=vM3x15mmHexStandoffDatasheet());
}
// file: oem/m3x5mm_threaded_insert.scad
include <generic/lib.scad>;

function vM3x5mmThreadedInsertDatasheet() =
     let(major_diameter=5.31)
     [["major_diameter", major_diameter],
      ["minor_diameter", major_diameter - 0.5],
      ["nominal_diameter", 3], ["length", 5]];

module mM3x5mmThreadedInsertTaperCone() {
     datasheet = vM3x5mmThreadedInsertDatasheet();
     translate([0, 0, -property(datasheet, "length")])
     cylinder(d1=property(datasheet, "minor_diameter"),
              d2=property(datasheet, "major_diameter"),
              h=property(datasheet, "length") + kEpsilon);
}

module mM3x5mmThreadedInsert() {
     import("stl/m3x5mm_threaded_insert.stl");
}

mM3x5mmThreadedInsert();
// file: generic/ball_caster_yoke.scad
include <lib.scad>;

function pvBallCasterYokeDatasheet(main_diameter, base_thickness, mount_offset, mount_diameter, mount_height=0) =
     assert(main_diameter > 0)
     assert(base_thickness > 0)
     assert(mount_offset > 0)
     assert(mount_diameter > 0)
     [["main_diameter", main_diameter], ["base_thickness", base_thickness],
      ["mount_offset", mount_offset], ["mount_diameter", mount_diameter],
      ["mount_height", mount_height]];

module pmBallCasterYoke(datasheet) {
     main_diameter = property(datasheet, "main_diameter");
     base_thickness = property(datasheet, "base_thickness");
     mount_offset = property(datasheet, "mount_offset");
     mount_diameter = property(datasheet, "mount_diameter");
     mount_height = property(datasheet, "mount_height");

     linear_extrude(height=base_thickness) {
          hull() {
               circle(d=main_diameter);
               duplicate([0, 1, 0]) {
                    translate([0, mount_offset, 0]) {
                         circle(d=mount_diameter);
                    }
               }
          }
     }
     if (mount_height > 0) {
          translate([0, 0, base_thickness]) {
               duplicate([0, 1, 0]) {
                    translate([0, mount_offset, 0]) {
                         cylinder(h=mount_height, d=mount_diameter);
                    }
               }
          }
     }
}

pmBallCasterYoke(
     datasheet=pvBallCasterYokeDatasheet(
          main_diameter=12, base_thickness=2, mount_offset=10, mount_diameter=4, mount_height=5
     )
);
// main file
include <generic/lib.scad>;

use <generic/ball_caster_yoke.scad>;

use <oem/m3x5mm_threaded_insert.scad>
use <oem/m3_hex_standoff.scad>;

use <50mm_ball_caster_support.scad>;
use <50mm_ball_caster_spring_seat.scad>;

function v50mmBallCasterYokeDatasheet() =
     let(caster_support_datasheet=v50mmBallCasterSupportDatasheet(),
         caster_spring_seat_datasheet=v50mmBallCasterSpringSeatDatasheet())
     pvBallCasterYokeDatasheet(main_diameter=property(caster_support_datasheet, "main_diameter"),
                               base_thickness=property(caster_support_datasheet, "base_thickness"),
                               mount_offset=property(caster_support_datasheet, "mount_offset"),
                               mount_diameter=property(caster_support_datasheet, "mount_diameter"),
                               mount_height=property(caster_spring_seat_datasheet, "height"));

module m50mmBallCasterYoke() {
     datasheet = v50mmBallCasterYokeDatasheet();
     base_thickness = property(datasheet, "base_thickness");
     mount_offset = property(datasheet, "mount_offset");
     mount_height = property(datasheet, "mount_height");

     difference() {
          pmBallCasterYoke(datasheet);
          translate([0, 0, -kEpsilon]) {
               duplicate([0, 1, 0]) {
                    translate([0, mount_offset, 0]) {
                         translate([0, 0, mount_height]) {
                              linear_extrude(height=base_thickness + 2 * kEpsilon) {
                                   offset(delta=kEpsilon) {
                                        hull() projection() mM3x30mmHexStandoff();
                                   }
                              }
                         }
                         let(hole_diameter=property(vM3x30mmHexStandoffDatasheet(), "hole_diameter")) {
                              cylinder(h=mount_height + base_thickness + 2 * kEpsilon, d=hole_diameter);
                         }
                    }
               }
               let(hole_diameter=property(vM3x5mmThreadedInsertDatasheet(), "nominal_diameter")) {
                    cylinder(h=base_thickness + 2 * kEpsilon, d=hole_diameter);
               }
          }
     }
}

m50mmBallCasterYoke();
